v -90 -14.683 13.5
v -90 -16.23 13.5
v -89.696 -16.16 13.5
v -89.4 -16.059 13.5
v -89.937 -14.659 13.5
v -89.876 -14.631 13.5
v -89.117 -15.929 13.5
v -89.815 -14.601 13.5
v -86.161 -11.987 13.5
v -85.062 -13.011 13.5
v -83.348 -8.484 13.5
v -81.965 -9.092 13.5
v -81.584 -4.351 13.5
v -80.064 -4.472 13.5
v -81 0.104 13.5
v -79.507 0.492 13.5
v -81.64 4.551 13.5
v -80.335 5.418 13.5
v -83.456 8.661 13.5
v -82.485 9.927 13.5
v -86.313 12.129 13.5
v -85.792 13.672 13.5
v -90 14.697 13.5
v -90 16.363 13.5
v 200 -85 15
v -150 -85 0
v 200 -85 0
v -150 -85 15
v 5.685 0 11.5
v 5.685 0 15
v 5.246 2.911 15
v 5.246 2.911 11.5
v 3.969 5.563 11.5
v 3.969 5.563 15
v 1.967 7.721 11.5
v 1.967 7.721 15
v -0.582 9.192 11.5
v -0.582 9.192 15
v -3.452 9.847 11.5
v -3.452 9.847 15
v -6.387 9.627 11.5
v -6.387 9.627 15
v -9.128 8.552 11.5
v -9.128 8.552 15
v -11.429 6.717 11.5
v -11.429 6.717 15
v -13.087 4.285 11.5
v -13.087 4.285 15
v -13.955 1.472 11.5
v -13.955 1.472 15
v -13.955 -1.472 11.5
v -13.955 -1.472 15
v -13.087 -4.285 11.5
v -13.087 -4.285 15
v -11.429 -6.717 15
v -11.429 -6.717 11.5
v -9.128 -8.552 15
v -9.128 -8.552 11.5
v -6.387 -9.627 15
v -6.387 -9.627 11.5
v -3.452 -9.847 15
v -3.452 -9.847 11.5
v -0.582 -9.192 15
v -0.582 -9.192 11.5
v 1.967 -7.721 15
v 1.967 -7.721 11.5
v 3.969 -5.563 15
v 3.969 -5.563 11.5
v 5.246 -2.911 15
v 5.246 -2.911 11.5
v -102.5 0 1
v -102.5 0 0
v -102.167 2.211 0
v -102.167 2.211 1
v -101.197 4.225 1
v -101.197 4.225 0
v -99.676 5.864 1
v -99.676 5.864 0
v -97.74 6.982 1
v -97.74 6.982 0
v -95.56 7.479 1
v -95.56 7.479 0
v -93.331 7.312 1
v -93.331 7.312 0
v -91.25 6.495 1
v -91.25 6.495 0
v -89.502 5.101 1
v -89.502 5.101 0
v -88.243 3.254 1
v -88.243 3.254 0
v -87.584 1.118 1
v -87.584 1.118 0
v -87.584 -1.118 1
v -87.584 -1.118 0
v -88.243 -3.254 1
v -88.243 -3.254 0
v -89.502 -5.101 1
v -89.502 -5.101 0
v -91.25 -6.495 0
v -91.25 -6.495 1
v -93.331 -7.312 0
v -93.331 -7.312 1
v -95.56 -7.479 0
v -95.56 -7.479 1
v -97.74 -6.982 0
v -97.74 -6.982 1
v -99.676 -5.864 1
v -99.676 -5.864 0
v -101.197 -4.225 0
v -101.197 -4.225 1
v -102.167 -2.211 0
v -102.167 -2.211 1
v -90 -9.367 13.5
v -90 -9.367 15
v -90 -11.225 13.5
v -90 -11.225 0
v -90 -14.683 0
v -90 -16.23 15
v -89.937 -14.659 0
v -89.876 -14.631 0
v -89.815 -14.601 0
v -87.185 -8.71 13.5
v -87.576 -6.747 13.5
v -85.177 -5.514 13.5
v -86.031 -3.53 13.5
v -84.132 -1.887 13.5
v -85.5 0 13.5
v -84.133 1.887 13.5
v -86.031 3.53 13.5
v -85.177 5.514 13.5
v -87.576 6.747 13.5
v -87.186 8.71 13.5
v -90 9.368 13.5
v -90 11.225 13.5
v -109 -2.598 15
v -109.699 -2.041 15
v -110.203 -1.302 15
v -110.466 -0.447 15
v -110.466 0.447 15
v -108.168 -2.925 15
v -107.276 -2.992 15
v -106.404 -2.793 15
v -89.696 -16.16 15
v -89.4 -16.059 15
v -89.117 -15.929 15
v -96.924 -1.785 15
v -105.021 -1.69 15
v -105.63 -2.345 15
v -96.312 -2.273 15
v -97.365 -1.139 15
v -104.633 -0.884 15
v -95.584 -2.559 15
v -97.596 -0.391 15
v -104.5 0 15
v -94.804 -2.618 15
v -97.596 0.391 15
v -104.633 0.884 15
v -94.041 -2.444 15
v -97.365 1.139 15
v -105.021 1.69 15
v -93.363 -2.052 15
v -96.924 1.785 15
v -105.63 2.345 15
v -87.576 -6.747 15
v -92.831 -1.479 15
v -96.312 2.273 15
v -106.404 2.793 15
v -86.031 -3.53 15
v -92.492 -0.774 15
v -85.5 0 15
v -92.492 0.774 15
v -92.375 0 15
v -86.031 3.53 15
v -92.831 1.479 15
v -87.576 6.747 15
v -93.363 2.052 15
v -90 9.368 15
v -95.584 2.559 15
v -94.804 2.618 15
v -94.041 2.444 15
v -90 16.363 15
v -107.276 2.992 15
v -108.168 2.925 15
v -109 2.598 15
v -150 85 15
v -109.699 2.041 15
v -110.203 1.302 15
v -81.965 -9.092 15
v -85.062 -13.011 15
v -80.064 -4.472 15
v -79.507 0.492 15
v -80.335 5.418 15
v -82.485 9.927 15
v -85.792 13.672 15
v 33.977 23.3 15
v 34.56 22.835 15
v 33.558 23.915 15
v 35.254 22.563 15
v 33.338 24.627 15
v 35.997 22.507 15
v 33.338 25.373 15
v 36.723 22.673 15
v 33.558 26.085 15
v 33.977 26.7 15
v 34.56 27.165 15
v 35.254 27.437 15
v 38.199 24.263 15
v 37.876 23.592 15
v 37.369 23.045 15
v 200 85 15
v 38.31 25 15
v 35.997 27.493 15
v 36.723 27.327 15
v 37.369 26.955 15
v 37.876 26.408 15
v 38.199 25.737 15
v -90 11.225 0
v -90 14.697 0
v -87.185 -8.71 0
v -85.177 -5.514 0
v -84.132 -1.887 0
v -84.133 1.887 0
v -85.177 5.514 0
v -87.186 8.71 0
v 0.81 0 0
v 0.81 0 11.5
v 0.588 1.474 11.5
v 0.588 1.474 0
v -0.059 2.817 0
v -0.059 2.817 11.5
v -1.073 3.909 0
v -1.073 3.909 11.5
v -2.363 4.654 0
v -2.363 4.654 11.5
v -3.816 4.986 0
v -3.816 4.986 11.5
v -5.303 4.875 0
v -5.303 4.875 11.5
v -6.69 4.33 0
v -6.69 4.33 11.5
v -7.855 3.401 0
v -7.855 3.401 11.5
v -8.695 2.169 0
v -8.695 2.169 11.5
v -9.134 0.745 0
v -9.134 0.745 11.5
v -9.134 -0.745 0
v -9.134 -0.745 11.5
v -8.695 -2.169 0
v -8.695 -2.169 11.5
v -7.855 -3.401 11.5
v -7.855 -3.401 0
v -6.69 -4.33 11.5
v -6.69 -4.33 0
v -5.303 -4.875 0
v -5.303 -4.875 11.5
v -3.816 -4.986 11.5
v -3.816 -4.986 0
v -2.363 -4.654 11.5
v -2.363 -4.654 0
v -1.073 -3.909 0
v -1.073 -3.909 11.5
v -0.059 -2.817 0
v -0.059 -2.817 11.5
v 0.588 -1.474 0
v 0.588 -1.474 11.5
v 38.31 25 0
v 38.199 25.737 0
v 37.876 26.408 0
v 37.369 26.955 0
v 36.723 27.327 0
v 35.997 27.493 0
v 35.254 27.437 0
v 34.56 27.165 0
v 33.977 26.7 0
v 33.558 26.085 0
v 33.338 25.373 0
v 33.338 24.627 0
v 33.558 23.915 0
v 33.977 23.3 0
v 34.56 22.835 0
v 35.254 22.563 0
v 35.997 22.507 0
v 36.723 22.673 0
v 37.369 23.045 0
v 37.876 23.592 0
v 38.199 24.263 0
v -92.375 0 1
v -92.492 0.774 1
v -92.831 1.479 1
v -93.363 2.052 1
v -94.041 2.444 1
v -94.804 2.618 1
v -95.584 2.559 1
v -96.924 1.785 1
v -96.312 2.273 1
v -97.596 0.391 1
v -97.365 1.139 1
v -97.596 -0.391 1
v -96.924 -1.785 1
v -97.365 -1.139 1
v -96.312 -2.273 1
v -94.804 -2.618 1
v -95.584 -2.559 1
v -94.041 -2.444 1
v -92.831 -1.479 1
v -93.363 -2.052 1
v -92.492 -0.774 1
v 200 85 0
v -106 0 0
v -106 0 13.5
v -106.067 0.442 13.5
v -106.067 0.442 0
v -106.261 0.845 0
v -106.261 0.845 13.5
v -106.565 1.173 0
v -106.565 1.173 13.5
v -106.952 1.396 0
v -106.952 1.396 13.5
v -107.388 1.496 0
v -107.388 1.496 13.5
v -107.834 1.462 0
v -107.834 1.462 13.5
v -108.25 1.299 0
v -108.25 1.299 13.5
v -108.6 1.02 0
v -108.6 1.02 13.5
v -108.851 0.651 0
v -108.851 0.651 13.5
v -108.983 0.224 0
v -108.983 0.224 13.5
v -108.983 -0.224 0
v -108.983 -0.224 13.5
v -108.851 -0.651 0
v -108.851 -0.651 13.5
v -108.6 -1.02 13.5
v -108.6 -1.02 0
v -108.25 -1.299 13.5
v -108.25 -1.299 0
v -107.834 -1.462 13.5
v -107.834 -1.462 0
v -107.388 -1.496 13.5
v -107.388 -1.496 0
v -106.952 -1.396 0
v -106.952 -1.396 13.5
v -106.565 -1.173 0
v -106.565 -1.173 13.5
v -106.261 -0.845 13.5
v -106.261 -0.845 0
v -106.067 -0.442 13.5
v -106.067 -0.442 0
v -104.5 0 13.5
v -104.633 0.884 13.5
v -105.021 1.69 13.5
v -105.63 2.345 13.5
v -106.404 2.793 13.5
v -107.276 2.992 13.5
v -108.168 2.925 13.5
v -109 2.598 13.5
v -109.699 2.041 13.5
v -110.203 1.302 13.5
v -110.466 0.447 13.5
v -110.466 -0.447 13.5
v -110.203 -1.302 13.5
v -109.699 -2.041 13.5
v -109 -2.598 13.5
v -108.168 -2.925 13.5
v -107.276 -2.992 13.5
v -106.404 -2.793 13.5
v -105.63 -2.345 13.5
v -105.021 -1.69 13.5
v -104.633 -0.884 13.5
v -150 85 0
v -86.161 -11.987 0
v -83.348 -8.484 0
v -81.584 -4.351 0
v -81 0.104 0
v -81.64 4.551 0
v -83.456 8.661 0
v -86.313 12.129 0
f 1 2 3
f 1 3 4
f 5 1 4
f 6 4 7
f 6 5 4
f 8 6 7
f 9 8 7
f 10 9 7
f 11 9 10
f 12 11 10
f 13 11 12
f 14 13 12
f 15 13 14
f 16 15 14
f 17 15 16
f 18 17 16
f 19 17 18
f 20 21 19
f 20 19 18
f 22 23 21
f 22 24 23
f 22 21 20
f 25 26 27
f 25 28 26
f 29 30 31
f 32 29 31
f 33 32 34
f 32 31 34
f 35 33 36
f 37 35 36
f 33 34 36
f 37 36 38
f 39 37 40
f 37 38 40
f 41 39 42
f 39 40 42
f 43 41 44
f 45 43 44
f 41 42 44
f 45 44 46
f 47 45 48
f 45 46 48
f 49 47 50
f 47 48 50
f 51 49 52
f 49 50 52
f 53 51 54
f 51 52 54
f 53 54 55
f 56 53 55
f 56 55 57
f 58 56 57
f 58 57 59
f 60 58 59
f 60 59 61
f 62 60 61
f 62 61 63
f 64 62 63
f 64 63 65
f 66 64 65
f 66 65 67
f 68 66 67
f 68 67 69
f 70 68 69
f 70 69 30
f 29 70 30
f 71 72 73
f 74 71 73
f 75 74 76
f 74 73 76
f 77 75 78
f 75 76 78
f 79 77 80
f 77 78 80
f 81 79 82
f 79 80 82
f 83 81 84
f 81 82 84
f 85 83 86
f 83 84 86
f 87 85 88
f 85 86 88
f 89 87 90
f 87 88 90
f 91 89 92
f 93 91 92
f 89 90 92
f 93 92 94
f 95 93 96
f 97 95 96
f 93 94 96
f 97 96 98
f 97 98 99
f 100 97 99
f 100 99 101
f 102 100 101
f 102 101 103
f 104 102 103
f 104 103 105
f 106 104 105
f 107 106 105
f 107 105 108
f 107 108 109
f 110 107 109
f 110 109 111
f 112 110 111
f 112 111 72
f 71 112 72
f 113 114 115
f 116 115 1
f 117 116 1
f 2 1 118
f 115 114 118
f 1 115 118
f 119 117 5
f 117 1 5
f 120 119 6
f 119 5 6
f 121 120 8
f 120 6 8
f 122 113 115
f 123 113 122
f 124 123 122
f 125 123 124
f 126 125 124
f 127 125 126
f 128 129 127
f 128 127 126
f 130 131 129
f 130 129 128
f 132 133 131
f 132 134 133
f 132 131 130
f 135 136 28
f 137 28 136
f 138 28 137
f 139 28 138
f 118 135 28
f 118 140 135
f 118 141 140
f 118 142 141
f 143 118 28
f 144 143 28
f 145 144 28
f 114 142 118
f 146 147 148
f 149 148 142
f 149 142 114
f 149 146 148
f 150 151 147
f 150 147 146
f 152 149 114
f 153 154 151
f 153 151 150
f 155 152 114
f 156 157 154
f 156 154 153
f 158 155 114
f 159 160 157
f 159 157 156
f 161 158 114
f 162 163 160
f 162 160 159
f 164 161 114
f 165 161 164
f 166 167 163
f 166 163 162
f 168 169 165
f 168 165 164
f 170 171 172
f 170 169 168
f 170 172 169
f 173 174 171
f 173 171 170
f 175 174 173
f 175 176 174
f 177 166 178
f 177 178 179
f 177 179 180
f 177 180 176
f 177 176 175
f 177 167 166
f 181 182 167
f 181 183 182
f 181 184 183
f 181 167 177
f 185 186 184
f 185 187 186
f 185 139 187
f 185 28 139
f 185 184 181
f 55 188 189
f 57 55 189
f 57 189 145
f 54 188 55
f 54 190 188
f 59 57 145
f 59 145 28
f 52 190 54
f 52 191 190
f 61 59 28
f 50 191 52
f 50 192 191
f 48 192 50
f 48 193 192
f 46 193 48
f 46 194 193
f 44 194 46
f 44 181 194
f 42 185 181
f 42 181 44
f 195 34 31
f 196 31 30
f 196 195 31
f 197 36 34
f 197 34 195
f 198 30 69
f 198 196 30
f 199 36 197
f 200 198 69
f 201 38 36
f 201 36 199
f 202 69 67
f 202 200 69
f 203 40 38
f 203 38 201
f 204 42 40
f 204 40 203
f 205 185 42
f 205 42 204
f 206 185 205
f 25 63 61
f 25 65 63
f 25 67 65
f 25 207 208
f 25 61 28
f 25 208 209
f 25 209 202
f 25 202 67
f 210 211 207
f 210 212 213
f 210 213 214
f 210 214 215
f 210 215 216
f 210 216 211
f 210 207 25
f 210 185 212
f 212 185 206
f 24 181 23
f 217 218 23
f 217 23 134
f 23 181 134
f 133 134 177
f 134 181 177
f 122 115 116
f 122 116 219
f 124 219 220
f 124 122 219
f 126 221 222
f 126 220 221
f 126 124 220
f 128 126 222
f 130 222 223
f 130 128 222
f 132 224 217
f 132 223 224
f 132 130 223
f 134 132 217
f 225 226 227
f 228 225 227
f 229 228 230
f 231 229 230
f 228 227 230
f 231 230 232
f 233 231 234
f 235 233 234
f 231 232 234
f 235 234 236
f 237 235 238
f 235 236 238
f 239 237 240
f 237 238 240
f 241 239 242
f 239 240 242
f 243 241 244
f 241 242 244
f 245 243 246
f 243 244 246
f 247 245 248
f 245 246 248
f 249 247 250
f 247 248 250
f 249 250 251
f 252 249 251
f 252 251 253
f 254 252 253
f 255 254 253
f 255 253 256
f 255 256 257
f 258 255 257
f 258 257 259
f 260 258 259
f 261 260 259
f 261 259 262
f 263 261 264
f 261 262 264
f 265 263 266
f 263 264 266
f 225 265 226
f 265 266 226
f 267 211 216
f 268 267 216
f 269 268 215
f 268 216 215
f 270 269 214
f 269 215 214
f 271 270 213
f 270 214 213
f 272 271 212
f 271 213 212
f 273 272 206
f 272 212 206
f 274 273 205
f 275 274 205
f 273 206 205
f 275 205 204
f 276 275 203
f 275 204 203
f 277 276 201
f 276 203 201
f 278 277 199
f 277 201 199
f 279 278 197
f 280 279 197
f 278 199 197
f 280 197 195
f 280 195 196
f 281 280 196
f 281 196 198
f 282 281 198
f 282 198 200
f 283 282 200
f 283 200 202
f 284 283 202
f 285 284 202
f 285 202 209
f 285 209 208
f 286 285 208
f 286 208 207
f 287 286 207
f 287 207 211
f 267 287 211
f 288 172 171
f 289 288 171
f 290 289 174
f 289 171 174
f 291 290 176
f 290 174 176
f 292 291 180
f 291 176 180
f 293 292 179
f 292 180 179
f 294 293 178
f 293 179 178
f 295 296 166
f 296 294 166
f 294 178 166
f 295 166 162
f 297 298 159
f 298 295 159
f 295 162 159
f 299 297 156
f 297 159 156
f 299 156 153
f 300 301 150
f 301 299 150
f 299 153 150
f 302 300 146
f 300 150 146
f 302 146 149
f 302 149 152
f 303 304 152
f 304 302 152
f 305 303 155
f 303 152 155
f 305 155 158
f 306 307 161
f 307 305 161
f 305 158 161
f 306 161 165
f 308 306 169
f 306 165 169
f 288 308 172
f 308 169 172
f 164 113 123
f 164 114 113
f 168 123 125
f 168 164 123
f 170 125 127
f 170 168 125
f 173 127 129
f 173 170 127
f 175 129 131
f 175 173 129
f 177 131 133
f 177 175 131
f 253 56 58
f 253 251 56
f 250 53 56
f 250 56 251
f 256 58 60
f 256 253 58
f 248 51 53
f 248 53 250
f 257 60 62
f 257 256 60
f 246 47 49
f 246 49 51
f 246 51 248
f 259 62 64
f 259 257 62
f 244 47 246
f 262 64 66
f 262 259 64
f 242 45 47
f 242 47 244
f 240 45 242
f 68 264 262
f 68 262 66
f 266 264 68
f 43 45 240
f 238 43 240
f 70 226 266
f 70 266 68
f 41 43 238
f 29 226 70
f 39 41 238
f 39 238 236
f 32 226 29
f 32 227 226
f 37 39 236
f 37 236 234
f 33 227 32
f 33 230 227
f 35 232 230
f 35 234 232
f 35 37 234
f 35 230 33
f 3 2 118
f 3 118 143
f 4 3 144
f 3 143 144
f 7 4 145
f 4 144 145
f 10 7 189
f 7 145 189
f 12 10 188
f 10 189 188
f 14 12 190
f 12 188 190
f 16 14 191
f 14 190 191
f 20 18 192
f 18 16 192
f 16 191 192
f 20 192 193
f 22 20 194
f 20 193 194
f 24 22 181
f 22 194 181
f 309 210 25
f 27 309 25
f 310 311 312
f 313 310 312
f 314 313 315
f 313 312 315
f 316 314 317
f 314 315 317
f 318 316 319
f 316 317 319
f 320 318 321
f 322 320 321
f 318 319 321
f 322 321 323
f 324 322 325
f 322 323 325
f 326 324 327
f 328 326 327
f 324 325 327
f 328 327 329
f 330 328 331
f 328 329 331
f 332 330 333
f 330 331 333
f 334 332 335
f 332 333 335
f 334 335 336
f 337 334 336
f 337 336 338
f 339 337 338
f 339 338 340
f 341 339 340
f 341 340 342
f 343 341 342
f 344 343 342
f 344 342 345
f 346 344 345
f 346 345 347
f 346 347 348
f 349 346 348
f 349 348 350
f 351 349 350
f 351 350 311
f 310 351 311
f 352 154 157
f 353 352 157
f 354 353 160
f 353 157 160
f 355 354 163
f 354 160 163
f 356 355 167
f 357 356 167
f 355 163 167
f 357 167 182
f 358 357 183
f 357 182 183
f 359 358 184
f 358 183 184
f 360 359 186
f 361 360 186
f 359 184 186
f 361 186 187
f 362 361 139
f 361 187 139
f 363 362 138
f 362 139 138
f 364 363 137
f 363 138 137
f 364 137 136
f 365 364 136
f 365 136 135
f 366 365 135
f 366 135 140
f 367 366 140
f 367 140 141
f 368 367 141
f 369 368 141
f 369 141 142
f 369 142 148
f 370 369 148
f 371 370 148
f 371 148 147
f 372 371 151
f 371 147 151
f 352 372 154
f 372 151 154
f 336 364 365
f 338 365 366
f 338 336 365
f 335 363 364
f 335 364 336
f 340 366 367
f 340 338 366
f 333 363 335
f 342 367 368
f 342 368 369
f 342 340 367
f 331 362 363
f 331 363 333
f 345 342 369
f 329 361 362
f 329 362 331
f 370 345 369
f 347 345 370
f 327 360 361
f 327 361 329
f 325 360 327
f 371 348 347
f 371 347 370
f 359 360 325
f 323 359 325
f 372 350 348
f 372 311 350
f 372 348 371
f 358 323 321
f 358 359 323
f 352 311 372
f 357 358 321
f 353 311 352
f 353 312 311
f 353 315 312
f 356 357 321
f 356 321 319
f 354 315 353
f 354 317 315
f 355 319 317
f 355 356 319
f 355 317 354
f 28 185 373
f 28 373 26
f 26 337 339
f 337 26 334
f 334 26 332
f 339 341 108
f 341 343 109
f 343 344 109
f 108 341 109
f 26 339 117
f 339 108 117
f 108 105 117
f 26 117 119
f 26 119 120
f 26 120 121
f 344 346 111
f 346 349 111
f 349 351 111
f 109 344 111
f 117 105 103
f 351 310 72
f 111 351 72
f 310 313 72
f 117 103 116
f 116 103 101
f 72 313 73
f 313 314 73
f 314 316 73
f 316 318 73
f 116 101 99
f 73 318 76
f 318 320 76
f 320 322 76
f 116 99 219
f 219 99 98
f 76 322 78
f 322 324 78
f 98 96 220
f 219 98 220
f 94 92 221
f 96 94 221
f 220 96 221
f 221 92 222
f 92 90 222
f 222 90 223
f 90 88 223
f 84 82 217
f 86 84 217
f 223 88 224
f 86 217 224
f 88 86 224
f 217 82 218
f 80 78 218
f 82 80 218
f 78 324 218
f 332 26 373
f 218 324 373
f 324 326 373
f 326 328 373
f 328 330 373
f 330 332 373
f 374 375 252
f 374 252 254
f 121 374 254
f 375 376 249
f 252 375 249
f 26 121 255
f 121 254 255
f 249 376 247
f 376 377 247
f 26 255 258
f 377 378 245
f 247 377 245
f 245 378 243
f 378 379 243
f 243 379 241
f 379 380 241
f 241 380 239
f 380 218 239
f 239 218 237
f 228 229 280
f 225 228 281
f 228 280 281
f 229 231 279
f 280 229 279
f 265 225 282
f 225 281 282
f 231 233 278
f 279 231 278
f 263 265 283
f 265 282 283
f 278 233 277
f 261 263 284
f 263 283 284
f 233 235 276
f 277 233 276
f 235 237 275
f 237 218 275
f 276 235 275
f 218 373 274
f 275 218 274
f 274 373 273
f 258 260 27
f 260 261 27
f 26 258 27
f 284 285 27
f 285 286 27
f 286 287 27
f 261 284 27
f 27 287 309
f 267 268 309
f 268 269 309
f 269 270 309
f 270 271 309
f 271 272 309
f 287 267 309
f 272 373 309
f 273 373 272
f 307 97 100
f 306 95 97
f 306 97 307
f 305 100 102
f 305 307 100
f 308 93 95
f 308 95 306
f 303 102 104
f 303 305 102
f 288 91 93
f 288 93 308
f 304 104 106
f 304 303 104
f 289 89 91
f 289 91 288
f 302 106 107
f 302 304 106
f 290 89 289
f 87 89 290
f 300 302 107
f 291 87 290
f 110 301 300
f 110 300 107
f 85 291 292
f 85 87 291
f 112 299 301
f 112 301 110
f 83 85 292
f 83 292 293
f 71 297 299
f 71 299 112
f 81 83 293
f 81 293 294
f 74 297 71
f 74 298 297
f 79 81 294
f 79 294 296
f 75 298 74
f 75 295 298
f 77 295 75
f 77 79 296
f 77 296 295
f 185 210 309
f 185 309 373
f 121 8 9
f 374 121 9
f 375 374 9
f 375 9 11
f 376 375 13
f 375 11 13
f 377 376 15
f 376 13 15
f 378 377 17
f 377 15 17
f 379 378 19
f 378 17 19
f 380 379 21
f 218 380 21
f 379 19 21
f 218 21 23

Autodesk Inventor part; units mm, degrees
ref_plane "YZ Plane" through (0, 0, 0) normal (1, 0, 0) x (0, 1, 0)
ref_plane "XZ Plane" through (0, 0, 0) normal (0, 1, 0) x (-1, 0, 0)
sketch "Boceto2" plane through (0, 0, 0) normal (0, 0, 1) x (1, 0, 0)
  line L0 (130, -85) -> (-130, -85)
  line L1 (-130, -85) -> (-130, 85)
  line L2 (-130, 85) -> (130, 85)
  line L3 (130, 85) -> (130, -85)
  line L4 (130, -85) -> (-130, 85) construction
  line L5 (-130, -85) -> (130, 85) construction
  point P0 (0, 0)
  dimension "d0" = 260
  dimension "d1" = 170
extrude "Extrusión1" add sketch "Boceto2" along normal blind 15
sketch "Boceto3" plane through (0, 0, 15) normal (0, 0, 1) x (1, 0, 0)
  line L0 (-95, 0) -> (-4.19, 0) construction
  circle A0 centre (-95, 0) radius 2.625
  circle A1 centre (-4.19, 0) radius 9.875
  line L1 (-130, 85) -> (-130, -85) projected
  line L2 (130, -85) -> (130, 85) projected
  line L3 (-130, -85) -> (130, -85) projected
  line L4 (130, 0) -> (80, 0) construction
  line L5 (80, 0) -> (80, -23.2237) construction
  arc A2 (-102.5, -15.9496) -> (-102.5, 15.9496) centre (-109.9995, 0) ccw
  arc A3 (-102.5, -9.8973) -> (-102.5, 9.8973) centre (-109.9995, 0) ccw
  line L6 (-95, 0) -> (-102.5, 0)
  line L7 (-102.5, 15.9496) -> (-102.5, 12.8966)
  line L8 (-102.5, 15.9496) -> (-102.5, 9.8973)
  line L9 (-102.5, -9.8973) -> (-102.5, -15.9496)
  point P0 (0, 0)
  point P1 (-130, 0)
  point P2 (-92.375, 0)
  point P3 (-97.5893, -0.4312)
  point P4 (-97.5893, 0.4312)
  dimension "d7" = 5.25
  dimension "d8" = 19.75
  dimension "d14" = 85
  dimension "d29" = 50
  dimension "d31" = 35
  dimension "d32" = 134.19
  dimension "d139" = 125.81
  dimension "d141" = 7.5
sketch "Boceto5" plane through (0, 0, 0) normal (0, 0, -1) x (-1, 0, 0)
  line L0 (-130, -85) -> (-130, 85) projected
  line L1 (130, -85) -> (-130, -85)
  line L2 (-130, -85) -> (-130, 85)
  line L3 (-130, 85) -> (130, 85)
  line L4 (130, 85) -> (130, -85)
  line L5 (130, -85) -> (-130, 85) construction
  line L6 (-130, -85) -> (130, 85) construction
  line L7 (119.5, 74.5) -> (-119.5, 74.5)
  line L8 (-119.5, 74.5) -> (-119.5, -74.5)
  line L9 (-119.5, -74.5) -> (119.5, -74.5)
  line L10 (119.5, -74.5) -> (119.5, 74.5)
  circle A0 centre (95, 0) radius 2.625 projected
  circle A1 centre (95, 0) radius 2.625
  point P0 (0, 0)
  dimension "d23" = 10.5
  dimension "d25" = 5.25
sketch "Boceto6" plane through (0, 0, 15) normal (0, 0, 1) x (1, 0, 0)
  circle A0 centre (-4.19, 0) radius 10.125 projected
  line L0 (-4.19, 0) -> (35.81, 0)
  line L1 (35.81, 0) -> (35.81, 25)
  circle A1 centre (35.81, 25) radius 2.5
  point P0 (0, 0)
  dimension "d35" = 40
  dimension "d36" = 25
  dimension "d152" = 5
ref_plane "Plano de trabajo4" through (0, 0, -4) normal (0, 0, -1) x (-1, 0, 0)
sketch "Boceto10" plane through (0, 0, -4) normal (0, 0, -1) x (-1, 0, 0)
  circle A0 centre (95, 0) radius 2.625 projected
  circle A1 centre (95, 0) radius 7.5
  point P0 (0, 0)
  dimension "d51" = 15
ref_plane "Plano de trabajo1" through (-95, 0, 0) normal (0, 0, -1) x (-1, 0, 0)
sketch "Boceto12" plane through (0, 0, 15) normal (0, 0, 1) x (1, 0, 0)
  circle A0 centre (-95, 0) radius 2.625 construction
  circle A1 centre (-95, 0) radius 7.5 construction
  line L0 (-95, 0) -> (-82.5, 0) construction
  circle A2 centre (-82.5, 0) radius 3
  line L1 (-95, 0) -> (-107.5, 0) construction
  circle A3 centre (-107.5, 0) radius 3
  circle A4 centre (-107.5, 0) radius 1.5 construction
  circle A5 centre (-82.5, 0) radius 1.5 construction
  line L2 (-82.5, 0) -> (-97.5, 0) construction
  line L3 (-97.5, 0) -> (-97.5, 18.5) construction
  arc A6 (-89.1168, -15.9286) -> (-89.9998, 16.363) centre (-97.5, 0) ccw
  arc A7 (-89.9998, -16.2295) -> (-89.1168, -15.9286) centre (-90.514, -13.2739) ccw
  arc A8 (-89.9998, -16.2295) -> (-89.1168, -15.9286) centre (-90.514, -13.2739) ccw
  arc A9 (-92.595, 10.9517) -> (-92.4052, 10.8647) centre (-91.2508, 13.6338) ccw
  arc A10 (-89.9998, -16.2295) -> (-89.1168, -15.9286) centre (-90.514, -13.2739) ccw
  arc A11 (-89.8154, -14.6013) -> (-90, 14.6969) centre (-97.5, 0) ccw
  arc A12 (-89.9998, -11.2249) -> (-90, 11.225) centre (-97.5, 0) ccw
  arc A13 (-89.9998, -14.683) -> (-89.8154, -14.6013) centre (-90.514, -13.2739) ccw
  circle A14 centre (-82.5, 0) radius 1.5
  line L4 (-130, 85) -> (-130, -85) projected
  line L5 (-130, -85) -> (130, -85) projected
  line L6 (-82.5, 0) -> (-90, 0) construction
  line L7 (-90, 0) -> (-90, 18.2385) construction
  line L8 (-89.9998, 16.363) -> (-89.9998, -17.0131)
  arc A15 (-89.9998, -9.3674) -> (-90, 9.3675) centre (-97.5, 0) ccw
  arc A16 (-92.4052, 10.8647) -> (-92.6345, 10.9694) centre (-97.5, 0) ccw
  point P0 (0, 0)
  point P1 (-89.8154, -14.6013)
  point P2 (-91.2126, -11.9465)
  point P3 (-84.225, -2.4545)
  point P4 (-79.5, 0)
  point P5 (-81.225, -2.7156)
  point P6 (-84.225, 2.4545)
  point P7 (-81.225, 2.7156)
  point P8 (-84, 0)
  point P9 (-81, 0)
  point P10 (-89.9998, 11.2249)
  point P11 (-89.9998, 9.3674)
  point P12 (-85.5, 0)
  point P13 (-89.9998, 14.6969)
  dimension "d59" = 15
  dimension "d60" = 12.5
  dimension "d61" = 6
  dimension "d62" = 12.5
  dimension "d63" = 6
  dimension "d64" = 3
  dimension "d65" = 3
  dimension "d126" = 15
  dimension "d127" = 6
  dimension "d128" = 6
  dimension "d129" = 1.5
  dimension "d130" = 1.5
  dimension "d135" = 3
extrude "Extrusión10" cut sketch "Boceto12" against normal blind 1.5 contours A2 A11 | A11 A14 A12 A2 | A2 A12 A14 A11 | A12 A2 | A14 | A3
sketch "Boceto13" plane through (-82.5, 0, 13.5) normal (0, 0, 1) x (1, 0, 0)
  circle A0 centre (0, 0) radius 1.5
  circle A1 centre (-25, 0) radius 3 projected
  circle A2 centre (-25, 0) radius 1.5
  point P0 (82.5, 0)
  dimension "d68" = 3
  dimension "d69" = 3
extrude "Extrusión11" cut sketch "Boceto13" against normal through all contours A0 | A2
extrude "Extrusión12" cut sketch "Boceto10" against normal blind 5
ref_plane "Plano de trabajo2" through (-4.19, 0, 15) normal (0, 0, 1) x (1, 0, 0)
sketch "Boceto15" plane through (-4.19, 0, 15) normal (0, 0, 1) x (1, 0, 0)
  circle A0 centre (0, 0) radius 5
  circle A1 centre (0, 0) radius 74 construction
  circle A2 centre (-90.81, 0) radius 2.625 construction
  circle A3 centre (-90.81, 0) radius 20 construction
  point P0 (4.19, 0)
  dimension "d77" = 10
  dimension "d80" = 148
  dimension "d82" = 40
extrude "Extrusión14" cut sketch "Boceto15" against normal through all
ref_plane "Plano de trabajo3" through (0, 0, -4) normal (0, 0, -1) x (-1, 0, 0)
sketch "Boceto17" plane through (0, 0, 15) normal (0, 0, 1) x (1, 0, 0)
  circle A0 centre (-95, 0) radius 2.625 construction
  circle A1 centre (-4.19, 0) radius 5 construction
  circle A2 centre (-4.19, 0) radius 40
  circle A3 centre (-4.19, 0) radius 15
  point P0 (0, 0)
  dimension "d87" = 80
  dimension "d88" = 30
sketch "Boceto20" plane through (0, 0, 15) normal (0, 0, 1) x (1, 0, 0)
  line L0 (130, 85) -> (-130, 85) projected
  line L1 (130, -85) -> (130, 85)
  line L2 (130, 85) -> (220, 85)
  line L3 (220, 85) -> (220, -85)
  line L4 (220, -85) -> (130, -85)
  line L5 (130, -85) -> (130, 85)
  point P0 (0, 0)
  dimension "d115" = 90
extrude "Extrusión22" add sketch "Boceto20" against normal blind 15
extrude "Extrusión23" cut sketch "Boceto3" against normal through all contours A0 A3 | A3 L6 A0 | A0 L6 A3
extrude "Extrusión24" [suppressed]
extrude "Extrusión25" cut sketch "Boceto12" against normal blind 1.5 contours A2 A11 | A6 A7 L8 A13 A11 A2 | A2 A11 L8 A6 | A12 A2 | A2 A15 L8 A12 | A12 L8 A15 A2
extrude "Extrusión26" cut sketch "Boceto12" against normal through all contours A11 A14 A12 A2 | A2 A12 L8 A11 | A11 A13 L8 A12 A2 | A2 A12 A14 A11
sketch "Boceto21" plane through (0, 0, 15) normal (0, 0, 1) x (1, 0, 0)
  line L0 (-130, 85) -> (-150, 85)
  line L1 (-150, 85) -> (-150, -85)
  line L2 (-150, -85) -> (-130, -85)
  line L3 (-130, -85) -> (-130, 85)
  line L4 (220, 85) -> (-130, 85) projected
  line L5 (-130, -85) -> (220, -85) projected
  line L6 (220, 85) -> (200, 85)
  line L7 (200, 85) -> (200, -85)
  line L8 (200, -85) -> (220, -85)
  line L9 (220, -85) -> (220, 85)
  point P0 (0, 0)
  dimension "d146" = 20
  dimension "d147" = 20
extrude "Extrusión28" add sketch "Boceto21" against normal blind 15 contours L3 L2 L1 L0
extrude "Extrusión29" cut sketch "Boceto21" against normal through all contours L4 L9 L5 L7
extrude "Extrusión30" cut sketch "Boceto6" against normal through all contours A1
extrude "Extrusión31" cut sketch "Boceto3" against normal blind 3.5 contours A1
properties part number "Cover"
